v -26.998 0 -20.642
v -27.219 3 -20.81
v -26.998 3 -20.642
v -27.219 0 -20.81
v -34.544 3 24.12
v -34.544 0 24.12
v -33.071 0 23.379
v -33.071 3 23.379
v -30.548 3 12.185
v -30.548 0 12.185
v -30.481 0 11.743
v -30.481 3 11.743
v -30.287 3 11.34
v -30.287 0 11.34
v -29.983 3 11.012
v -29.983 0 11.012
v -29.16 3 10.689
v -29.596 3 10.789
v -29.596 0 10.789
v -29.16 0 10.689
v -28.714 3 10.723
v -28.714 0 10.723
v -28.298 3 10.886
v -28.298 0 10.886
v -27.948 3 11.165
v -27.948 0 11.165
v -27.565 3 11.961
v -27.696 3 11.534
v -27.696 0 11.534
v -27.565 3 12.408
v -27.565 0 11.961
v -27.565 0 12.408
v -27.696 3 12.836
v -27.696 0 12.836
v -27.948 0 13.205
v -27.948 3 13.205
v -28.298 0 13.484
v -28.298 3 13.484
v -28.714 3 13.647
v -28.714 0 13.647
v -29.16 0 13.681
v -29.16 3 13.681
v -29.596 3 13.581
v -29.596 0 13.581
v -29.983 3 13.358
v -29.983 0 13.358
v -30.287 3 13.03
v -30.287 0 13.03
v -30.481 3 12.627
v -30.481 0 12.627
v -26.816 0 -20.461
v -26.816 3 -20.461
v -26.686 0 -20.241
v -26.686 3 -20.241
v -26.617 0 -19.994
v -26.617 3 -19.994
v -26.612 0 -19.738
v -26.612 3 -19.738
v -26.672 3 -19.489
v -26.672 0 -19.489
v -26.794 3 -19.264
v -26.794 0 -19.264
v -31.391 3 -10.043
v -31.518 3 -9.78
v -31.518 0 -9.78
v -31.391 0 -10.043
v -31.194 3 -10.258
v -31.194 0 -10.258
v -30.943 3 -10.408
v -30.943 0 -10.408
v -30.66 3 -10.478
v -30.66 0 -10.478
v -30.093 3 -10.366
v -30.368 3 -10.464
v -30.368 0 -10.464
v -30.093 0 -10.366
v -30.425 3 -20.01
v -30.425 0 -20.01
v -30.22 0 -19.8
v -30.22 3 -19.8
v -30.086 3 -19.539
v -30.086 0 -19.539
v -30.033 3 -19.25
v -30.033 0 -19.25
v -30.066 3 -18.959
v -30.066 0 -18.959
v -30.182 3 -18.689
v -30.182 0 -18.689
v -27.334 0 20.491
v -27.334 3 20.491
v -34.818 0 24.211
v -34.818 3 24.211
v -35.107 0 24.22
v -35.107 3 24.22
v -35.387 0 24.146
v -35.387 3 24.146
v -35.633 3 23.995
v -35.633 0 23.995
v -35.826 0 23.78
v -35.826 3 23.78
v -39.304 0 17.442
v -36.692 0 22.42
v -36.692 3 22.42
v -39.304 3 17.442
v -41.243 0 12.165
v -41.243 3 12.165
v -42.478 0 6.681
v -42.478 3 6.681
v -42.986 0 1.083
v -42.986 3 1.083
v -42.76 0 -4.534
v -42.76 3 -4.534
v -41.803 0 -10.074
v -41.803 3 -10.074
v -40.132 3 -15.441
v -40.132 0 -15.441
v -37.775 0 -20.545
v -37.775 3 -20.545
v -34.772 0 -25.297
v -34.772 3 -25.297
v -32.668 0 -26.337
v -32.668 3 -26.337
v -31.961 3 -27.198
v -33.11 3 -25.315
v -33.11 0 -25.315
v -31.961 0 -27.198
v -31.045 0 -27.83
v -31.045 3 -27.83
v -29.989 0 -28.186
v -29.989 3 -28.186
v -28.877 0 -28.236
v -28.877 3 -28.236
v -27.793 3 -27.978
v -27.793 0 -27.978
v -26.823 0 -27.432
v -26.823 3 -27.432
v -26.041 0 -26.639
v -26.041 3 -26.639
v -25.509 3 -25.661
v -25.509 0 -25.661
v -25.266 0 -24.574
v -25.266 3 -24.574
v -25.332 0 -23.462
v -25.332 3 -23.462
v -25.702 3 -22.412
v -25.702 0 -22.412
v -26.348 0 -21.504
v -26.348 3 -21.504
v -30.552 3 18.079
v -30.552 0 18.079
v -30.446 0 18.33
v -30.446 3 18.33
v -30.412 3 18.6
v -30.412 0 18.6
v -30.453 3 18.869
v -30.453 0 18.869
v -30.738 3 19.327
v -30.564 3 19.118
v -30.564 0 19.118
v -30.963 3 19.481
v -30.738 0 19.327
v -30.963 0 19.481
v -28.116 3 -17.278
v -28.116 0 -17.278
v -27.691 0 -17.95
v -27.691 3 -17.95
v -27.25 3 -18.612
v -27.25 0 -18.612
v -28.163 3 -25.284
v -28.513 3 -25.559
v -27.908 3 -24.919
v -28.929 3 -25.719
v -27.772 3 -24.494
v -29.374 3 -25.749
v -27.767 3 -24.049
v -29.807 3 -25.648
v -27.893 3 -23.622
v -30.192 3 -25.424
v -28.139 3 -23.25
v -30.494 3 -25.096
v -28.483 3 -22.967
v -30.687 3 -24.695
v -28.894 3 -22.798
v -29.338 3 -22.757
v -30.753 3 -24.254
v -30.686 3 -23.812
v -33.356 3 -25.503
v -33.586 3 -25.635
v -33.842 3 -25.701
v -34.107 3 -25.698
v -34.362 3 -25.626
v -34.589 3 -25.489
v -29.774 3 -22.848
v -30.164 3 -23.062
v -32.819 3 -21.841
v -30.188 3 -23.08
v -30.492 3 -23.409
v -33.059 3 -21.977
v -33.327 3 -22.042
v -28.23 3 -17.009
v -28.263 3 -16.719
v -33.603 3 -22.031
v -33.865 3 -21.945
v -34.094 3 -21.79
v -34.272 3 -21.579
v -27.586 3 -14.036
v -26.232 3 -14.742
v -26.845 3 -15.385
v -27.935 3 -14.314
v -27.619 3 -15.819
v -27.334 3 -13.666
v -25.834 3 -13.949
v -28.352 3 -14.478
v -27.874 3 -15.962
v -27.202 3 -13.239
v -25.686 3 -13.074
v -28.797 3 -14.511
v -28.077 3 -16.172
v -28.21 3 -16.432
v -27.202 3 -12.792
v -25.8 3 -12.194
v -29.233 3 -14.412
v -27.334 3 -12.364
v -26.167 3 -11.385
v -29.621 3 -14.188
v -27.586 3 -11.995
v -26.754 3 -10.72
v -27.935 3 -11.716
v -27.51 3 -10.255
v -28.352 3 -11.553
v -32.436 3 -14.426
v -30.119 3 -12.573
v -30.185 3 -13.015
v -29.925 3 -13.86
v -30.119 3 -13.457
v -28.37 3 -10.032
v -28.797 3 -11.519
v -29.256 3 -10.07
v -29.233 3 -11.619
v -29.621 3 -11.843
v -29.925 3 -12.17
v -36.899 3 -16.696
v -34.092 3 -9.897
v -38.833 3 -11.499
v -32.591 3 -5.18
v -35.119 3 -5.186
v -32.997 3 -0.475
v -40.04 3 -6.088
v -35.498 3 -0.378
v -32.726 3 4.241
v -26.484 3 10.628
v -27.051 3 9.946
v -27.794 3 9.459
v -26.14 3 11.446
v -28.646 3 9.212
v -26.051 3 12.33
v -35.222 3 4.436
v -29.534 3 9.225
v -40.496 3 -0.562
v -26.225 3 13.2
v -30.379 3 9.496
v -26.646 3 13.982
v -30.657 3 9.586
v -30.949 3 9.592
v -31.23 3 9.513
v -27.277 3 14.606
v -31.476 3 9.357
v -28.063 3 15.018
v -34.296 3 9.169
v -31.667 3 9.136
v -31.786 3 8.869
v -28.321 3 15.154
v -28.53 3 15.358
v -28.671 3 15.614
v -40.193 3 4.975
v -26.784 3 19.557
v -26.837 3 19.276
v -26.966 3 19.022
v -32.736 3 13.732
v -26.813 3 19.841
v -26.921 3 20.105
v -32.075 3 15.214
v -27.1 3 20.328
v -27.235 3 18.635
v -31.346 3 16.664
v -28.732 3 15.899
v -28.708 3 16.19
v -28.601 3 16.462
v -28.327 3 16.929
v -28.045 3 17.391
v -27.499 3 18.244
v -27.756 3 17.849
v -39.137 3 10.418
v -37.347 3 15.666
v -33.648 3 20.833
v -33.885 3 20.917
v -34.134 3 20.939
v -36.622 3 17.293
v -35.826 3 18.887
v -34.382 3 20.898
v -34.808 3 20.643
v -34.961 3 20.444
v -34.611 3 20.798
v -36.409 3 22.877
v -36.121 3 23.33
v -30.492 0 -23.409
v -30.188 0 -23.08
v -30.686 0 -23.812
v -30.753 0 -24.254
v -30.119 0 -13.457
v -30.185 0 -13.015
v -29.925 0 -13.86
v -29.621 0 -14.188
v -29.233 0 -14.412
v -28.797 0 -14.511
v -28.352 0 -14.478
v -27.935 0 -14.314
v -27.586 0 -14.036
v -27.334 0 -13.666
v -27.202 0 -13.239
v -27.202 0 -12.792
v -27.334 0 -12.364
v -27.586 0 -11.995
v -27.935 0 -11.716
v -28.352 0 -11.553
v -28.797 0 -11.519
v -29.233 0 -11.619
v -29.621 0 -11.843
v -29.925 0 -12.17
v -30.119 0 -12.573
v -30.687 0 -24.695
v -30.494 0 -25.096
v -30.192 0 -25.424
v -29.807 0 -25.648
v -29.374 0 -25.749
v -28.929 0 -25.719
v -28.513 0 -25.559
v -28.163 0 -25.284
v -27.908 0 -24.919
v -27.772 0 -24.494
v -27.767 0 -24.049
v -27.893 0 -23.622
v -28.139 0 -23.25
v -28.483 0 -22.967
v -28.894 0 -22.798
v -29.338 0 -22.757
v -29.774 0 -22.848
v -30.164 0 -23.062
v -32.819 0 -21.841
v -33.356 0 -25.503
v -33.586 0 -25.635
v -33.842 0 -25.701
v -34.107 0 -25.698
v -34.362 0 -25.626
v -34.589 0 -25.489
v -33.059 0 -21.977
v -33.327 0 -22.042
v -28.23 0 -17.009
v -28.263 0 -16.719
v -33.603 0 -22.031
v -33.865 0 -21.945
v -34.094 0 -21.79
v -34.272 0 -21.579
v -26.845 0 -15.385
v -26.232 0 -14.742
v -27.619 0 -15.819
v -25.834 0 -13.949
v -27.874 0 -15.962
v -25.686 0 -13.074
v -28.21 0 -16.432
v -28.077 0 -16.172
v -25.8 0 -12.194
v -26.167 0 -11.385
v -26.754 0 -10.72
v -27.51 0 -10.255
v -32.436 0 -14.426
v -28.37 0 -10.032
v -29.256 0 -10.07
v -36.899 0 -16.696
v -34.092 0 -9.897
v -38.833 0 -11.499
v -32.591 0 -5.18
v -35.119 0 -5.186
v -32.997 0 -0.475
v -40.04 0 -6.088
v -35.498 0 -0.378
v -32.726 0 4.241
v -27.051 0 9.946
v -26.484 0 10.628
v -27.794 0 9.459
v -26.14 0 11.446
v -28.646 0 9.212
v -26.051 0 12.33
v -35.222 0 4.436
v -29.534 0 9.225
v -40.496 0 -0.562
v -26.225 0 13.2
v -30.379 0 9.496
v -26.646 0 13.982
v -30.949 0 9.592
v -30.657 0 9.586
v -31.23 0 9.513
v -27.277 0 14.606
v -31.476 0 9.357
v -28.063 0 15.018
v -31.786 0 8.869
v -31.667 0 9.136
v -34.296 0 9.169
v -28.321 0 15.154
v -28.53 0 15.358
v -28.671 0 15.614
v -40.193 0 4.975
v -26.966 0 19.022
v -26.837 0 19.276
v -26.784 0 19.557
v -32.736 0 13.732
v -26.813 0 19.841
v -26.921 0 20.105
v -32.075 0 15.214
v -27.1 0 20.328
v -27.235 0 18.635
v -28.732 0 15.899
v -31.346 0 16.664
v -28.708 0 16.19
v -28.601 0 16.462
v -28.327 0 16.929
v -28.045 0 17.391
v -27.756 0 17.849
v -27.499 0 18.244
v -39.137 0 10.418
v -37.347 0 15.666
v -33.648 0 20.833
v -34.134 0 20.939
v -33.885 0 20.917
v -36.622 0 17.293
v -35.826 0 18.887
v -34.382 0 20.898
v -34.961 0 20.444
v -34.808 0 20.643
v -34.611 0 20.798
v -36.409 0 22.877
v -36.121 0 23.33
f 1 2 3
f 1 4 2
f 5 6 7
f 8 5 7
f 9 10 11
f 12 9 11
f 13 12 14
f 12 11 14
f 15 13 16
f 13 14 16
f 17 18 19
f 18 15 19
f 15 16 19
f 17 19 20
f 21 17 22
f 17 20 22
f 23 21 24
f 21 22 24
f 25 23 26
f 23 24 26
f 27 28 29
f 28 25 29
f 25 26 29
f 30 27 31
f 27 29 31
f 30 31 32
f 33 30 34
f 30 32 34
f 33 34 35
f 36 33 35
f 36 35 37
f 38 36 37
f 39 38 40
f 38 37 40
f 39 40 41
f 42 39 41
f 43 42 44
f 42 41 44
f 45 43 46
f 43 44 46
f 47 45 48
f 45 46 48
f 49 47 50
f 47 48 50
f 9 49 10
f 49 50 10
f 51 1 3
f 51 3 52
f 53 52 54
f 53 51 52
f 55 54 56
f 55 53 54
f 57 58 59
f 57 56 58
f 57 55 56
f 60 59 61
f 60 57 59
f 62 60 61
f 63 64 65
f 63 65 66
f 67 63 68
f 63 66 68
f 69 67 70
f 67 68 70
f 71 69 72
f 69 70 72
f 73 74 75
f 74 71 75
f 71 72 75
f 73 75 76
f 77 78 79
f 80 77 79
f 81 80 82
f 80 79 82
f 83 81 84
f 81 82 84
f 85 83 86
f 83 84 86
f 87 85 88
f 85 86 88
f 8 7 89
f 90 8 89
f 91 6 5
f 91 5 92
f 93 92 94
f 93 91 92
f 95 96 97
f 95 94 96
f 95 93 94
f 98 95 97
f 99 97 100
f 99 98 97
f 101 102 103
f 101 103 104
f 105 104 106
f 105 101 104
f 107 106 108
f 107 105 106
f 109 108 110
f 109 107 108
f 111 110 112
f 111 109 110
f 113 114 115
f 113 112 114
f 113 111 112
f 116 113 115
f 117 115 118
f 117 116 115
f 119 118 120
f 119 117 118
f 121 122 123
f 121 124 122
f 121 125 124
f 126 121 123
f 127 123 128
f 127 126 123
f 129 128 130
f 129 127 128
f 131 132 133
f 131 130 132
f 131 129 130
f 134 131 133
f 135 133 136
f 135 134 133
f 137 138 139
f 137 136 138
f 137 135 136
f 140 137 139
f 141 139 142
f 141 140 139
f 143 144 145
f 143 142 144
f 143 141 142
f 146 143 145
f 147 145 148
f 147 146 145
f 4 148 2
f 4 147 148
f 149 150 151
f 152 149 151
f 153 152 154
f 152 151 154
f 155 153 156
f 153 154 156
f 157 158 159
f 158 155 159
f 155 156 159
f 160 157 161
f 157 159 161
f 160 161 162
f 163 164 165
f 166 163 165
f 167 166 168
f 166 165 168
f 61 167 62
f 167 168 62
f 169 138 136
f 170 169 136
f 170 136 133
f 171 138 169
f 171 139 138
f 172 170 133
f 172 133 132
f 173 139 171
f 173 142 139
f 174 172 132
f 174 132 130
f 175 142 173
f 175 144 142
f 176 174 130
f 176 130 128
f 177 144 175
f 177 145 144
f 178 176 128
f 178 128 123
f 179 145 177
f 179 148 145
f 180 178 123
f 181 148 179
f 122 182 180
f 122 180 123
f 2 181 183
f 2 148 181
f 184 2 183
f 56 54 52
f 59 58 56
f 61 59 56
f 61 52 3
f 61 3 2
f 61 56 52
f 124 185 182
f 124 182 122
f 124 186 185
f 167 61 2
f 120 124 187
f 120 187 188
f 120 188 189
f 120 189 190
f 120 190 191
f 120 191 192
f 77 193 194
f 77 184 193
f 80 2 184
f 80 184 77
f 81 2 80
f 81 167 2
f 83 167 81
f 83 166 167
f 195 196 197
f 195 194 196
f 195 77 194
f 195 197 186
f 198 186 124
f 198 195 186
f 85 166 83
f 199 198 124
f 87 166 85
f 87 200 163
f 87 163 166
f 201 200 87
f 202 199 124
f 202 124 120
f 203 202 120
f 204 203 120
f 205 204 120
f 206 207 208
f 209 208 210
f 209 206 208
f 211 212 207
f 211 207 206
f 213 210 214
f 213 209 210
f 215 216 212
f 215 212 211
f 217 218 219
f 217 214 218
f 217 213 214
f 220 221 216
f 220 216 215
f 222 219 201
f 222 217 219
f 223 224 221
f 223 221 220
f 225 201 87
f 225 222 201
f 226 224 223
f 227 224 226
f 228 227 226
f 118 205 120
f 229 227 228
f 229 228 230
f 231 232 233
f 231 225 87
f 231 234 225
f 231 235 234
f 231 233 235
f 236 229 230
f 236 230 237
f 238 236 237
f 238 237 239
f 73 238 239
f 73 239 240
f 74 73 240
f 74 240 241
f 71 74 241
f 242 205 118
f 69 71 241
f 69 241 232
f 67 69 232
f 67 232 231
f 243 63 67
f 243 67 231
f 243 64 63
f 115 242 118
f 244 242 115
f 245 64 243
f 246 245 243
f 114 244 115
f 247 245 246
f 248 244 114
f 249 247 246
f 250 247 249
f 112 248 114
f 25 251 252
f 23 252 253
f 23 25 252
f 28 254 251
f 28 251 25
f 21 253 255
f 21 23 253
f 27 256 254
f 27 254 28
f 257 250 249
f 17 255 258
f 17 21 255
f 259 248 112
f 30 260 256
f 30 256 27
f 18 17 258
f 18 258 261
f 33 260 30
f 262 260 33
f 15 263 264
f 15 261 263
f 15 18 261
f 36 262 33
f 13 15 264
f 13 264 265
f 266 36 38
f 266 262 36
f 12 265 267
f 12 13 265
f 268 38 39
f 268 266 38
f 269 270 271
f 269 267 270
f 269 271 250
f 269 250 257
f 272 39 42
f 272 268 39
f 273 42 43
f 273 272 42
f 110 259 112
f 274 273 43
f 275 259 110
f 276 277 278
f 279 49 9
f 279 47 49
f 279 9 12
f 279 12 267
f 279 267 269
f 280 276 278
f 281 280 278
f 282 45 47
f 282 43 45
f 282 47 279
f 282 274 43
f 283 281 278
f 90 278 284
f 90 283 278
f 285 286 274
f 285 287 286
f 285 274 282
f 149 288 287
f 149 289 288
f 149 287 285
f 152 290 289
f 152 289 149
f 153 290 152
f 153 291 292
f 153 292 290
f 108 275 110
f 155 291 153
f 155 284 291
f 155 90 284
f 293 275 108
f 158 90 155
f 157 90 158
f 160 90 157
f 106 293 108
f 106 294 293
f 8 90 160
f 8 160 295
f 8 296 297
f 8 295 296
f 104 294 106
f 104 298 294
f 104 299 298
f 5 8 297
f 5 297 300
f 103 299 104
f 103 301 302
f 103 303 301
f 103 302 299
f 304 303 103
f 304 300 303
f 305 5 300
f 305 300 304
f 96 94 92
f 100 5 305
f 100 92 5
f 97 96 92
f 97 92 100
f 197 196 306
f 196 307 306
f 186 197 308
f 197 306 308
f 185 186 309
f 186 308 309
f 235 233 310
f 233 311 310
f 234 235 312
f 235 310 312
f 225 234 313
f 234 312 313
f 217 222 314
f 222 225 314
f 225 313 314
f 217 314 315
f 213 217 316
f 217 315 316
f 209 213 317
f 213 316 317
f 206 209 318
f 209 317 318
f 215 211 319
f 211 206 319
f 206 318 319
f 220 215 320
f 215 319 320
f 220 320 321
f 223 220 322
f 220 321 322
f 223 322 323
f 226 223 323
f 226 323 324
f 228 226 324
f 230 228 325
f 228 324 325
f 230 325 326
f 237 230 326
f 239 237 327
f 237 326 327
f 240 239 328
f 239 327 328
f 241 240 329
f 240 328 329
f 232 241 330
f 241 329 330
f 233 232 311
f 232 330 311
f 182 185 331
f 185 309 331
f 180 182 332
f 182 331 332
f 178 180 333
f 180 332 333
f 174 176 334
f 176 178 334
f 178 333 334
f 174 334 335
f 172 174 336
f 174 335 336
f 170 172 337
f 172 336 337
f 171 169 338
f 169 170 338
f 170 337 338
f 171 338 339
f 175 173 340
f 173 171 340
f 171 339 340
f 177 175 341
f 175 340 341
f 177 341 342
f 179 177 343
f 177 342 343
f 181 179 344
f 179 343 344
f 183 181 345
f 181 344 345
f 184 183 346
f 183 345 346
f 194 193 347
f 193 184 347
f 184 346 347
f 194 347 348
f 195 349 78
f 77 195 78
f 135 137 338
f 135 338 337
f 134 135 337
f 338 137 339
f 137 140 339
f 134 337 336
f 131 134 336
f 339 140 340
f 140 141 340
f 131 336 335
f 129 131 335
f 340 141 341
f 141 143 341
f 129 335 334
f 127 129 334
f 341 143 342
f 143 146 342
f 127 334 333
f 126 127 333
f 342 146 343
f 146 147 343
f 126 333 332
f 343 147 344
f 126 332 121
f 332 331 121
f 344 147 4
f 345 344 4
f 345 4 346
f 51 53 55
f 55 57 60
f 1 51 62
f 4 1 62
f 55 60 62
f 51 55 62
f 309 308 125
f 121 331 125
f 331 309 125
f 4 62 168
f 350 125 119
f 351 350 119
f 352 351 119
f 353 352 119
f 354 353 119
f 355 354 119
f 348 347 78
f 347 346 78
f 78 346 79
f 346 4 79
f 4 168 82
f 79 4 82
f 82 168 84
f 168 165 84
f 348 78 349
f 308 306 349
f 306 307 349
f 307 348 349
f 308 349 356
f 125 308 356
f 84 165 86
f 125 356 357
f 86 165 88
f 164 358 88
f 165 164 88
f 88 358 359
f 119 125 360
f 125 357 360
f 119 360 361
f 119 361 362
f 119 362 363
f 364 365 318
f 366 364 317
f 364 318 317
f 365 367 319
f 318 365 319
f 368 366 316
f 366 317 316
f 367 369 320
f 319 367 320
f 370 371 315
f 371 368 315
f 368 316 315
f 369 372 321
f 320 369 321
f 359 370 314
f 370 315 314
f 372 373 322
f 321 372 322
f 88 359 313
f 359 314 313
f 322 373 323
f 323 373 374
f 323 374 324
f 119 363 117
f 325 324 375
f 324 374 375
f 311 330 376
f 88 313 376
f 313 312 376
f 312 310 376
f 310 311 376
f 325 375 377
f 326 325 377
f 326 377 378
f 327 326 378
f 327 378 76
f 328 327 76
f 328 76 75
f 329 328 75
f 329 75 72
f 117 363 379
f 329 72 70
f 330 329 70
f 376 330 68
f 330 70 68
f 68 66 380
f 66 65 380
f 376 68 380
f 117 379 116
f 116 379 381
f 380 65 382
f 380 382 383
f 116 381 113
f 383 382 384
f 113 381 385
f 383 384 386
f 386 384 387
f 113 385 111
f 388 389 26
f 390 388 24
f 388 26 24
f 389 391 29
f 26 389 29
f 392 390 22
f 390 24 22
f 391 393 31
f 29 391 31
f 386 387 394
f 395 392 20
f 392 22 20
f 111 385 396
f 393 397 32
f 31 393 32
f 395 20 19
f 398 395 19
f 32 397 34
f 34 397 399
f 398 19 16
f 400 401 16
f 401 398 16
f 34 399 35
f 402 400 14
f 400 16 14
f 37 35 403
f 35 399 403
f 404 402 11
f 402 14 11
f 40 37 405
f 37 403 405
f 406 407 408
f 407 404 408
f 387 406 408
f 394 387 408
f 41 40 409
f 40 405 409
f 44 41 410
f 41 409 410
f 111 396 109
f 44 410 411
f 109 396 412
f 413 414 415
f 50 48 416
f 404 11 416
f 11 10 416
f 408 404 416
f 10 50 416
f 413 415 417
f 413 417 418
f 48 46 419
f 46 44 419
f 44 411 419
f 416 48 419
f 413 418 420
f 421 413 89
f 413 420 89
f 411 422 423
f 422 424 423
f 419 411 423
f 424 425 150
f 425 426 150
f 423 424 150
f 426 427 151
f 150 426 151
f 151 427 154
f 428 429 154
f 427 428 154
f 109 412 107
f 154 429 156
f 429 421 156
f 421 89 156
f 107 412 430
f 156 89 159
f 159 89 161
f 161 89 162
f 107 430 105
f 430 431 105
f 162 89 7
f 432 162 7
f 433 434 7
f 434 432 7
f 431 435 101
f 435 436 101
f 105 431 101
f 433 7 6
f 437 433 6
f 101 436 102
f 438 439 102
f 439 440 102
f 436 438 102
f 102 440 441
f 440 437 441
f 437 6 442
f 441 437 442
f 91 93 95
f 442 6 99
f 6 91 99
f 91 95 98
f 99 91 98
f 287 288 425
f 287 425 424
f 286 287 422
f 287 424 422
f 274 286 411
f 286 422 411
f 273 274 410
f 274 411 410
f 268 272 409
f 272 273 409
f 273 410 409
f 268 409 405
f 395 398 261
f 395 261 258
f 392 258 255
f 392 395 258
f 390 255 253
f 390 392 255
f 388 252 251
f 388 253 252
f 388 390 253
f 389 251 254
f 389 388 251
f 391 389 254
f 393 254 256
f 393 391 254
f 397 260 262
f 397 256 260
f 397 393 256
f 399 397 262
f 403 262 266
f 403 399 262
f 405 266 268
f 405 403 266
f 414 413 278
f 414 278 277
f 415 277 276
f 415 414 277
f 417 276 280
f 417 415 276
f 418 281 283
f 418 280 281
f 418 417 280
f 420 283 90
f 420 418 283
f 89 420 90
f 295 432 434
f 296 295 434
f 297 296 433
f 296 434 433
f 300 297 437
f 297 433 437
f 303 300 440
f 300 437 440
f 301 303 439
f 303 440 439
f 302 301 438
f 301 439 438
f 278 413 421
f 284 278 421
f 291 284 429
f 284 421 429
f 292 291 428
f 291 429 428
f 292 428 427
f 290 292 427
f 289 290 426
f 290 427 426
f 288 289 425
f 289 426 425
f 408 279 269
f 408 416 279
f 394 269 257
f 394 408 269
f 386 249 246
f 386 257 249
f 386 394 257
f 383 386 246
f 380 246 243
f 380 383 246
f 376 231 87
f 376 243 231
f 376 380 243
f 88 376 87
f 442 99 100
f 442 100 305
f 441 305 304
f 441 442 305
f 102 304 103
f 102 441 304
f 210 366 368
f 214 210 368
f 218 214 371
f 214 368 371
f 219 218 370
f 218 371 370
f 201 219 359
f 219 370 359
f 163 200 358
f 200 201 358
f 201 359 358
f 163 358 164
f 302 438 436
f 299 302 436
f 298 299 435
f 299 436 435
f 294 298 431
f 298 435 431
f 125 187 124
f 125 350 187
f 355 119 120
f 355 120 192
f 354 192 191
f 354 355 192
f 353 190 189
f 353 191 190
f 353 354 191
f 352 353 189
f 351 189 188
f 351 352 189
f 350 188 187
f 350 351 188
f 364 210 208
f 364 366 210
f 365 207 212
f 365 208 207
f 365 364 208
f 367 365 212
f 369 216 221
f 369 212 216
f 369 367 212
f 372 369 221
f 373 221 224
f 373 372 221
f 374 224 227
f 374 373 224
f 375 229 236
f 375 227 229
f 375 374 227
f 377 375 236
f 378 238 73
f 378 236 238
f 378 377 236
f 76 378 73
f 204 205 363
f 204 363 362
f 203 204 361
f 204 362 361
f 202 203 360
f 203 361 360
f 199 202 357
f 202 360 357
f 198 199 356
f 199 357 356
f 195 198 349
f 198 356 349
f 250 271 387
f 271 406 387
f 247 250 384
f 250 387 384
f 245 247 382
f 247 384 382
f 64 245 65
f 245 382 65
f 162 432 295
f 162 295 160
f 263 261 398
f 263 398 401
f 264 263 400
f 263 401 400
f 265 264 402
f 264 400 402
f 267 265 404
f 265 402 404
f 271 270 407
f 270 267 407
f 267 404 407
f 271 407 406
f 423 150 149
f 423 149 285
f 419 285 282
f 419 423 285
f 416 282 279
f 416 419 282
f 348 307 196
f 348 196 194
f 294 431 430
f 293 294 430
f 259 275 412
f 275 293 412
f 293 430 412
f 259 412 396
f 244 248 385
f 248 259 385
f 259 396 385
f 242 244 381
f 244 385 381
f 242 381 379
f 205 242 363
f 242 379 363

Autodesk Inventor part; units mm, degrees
ref_plane "YZ Plane" through (0, 0, 0) normal (1, 0, 0) x (0, 1, 0)
ref_plane "XZ Plane" through (0, 0, 0) normal (0, 1, 0) x (-1, 0, 0)
ref_plane "XY Plane" through (0, 0, 0) normal (0, 0, 1) x (1, 0, 0)
sketch "Sketch1" plane through (0, 0, 0) normal (0, 1, 0) x (-1, 0, 0)
  arc A0 (34.7717, -25.2969) -> (36.6925, 22.4201) centre (0, 0) ccw
  circle A1 centre (28.6854, -13.0153) radius 1.5
  circle A2 centre (29.0479, 12.1849) radius 1.5
  line L0 (33.6483, 20.8328) -> (30.9628, 19.4812)
  arc A3 (32.7365, 13.7321) -> (30.5518, 18.0787) centre (0, 0) ccw
  arc A4 (37.3473, 15.6662) -> (34.9611, 20.4443) centre (0, 0) ccw
  arc A5 (34.9611, 20.4443) -> (33.6483, 20.8328) centre (34.0979, 19.9395) ccw
  arc A6 (30.9628, 19.4812) -> (30.5518, 18.0787) centre (31.4124, 18.5879) ccw
  line L1 (34.5435, 24.12) -> (27.3337, 20.4914)
  arc A7 (34.3646, 21.4319) -> (33.0708, 23.3788) centre (0, 0) ccw
  arc A8 (27.7564, 17.8489) -> (26.9661, 19.0218) centre (0, 0) ccw
  arc A9 (27.3337, 20.4914) -> (26.9661, 19.0218) centre (27.7833, 19.5982) ccw
  arc A10 (36.6925, 22.4201) -> (35.8263, 23.7798) centre (0, 0) ccw
  arc A11 (35.8263, 23.7798) -> (34.5435, 24.12) centre (34.9931, 23.2268) ccw
  circle A12 centre (29.253, -24.2541) radius 1.5
  arc A13 (27.2186, -20.8101) -> (33.1098, -25.315) centre (29.253, -24.2541) ccw
  arc A14 (28.0626, 15.0184) -> (30.379, 9.4963) centre (29.0479, 12.1849) ccw
  arc A15 (28.6009, 16.4618) -> (27.7564, 17.8489) centre (0, 0) ccw
  arc A16 (30.0933, -10.3662) -> (27.619, -15.8194) centre (28.6854, -13.0153) ccw
  arc A17 (31.5176, -9.7795) -> (31.7859, 8.8689) centre (0, 0) ccw
  arc A18 (26.7939, -19.2636) -> (28.1155, -17.2777) centre (0, 0) ccw
  arc A19 (30.0933, -10.3662) -> (31.5176, -9.7795) centre (30.5625, -9.4832) ccw
  arc A20 (28.1155, -17.2777) -> (27.619, -15.8194) centre (27.2635, -16.7541) ccw
  arc A21 (31.7859, 8.8689) -> (30.379, 9.4963) centre (30.8227, 8.6001) ccw
  arc A22 (28.0626, 15.0184) -> (28.6009, 16.4618) centre (27.7342, 15.963) ccw
  arc A23 (33.3556, -25.5029) -> (34.7717, -25.2969) centre (33.963, -24.7086) ccw
  arc A24 (26.7939, -19.2636) -> (26.9984, -20.6418) centre (27.6058, -19.8474) ccw
  arc A25 (34.2723, -21.5792) -> (33.0708, 23.3788) centre (0, 0) ccw
  arc A26 (30.182, -18.6894) -> (30.5518, 18.0787) centre (0, 0) ccw
  line L2 (32.8186, -21.8408) -> (30.4248, -20.0103)
  arc A27 (32.8186, -21.8408) -> (34.2723, -21.5792) centre (33.426, -21.0464) ccw
  arc A28 (30.182, -18.6894) -> (30.4248, -20.0103) centre (31.0322, -19.2159) ccw
  line L3 (33.3556, -25.5029) -> (33.1098, -25.315)
  line L4 (30.1876, -23.0805) -> (30.1642, -23.0625)
  line L5 (27.2186, -20.8101) -> (26.9984, -20.6418)
  point P0 (26.2158, -20.0433)
  point P1 (29.6958, -19.4528)
  dimension "d2" = 3
  dimension "d0" = 1
  dimension "d1" = 8
  dimension "d3" = 3
  dimension "d4" = 43
  dimension "d5" = 33
  dimension "d6" = 33
  dimension "d7" = 2.5339
  dimension "d8" = 3.4819
  dimension "d9" = 29.0479
  dimension "d10" = 1
  dimension "d11" = 1
  dimension "d12" = 40.5
  dimension "d13" = 1
  dimension "d14" = 1
  dimension "d15" = 43
  dimension "d16" = 40.5
  dimension "d17" = 35.5
  dimension "d18" = 64.12
  dimension "d19" = 2.5829
  dimension "d20" = 0.0025
  dimension "d21" = 35.1283
  dimension "d22" = 6.2779
  dimension "d23" = 40.0956
  dimension "d24" = 0.0494
  dimension "d25" = 37.8965
  dimension "d26" = 40.9793
  dimension "d27" = 30.7911
  dimension "d28" = 9.8494
  dimension "d29" = 8.7909
  dimension "d30" = 37.6697
  dimension "d31" = 0.0165
  dimension "d32" = 0
  dimension "d33" = 6.0158
  dimension "d34" = 0.0025
extrude "Extrusion1" add sketch "Sketch1" along normal blind 3
properties part number "Reverse Gear Link 1 updated" material "Copper"
